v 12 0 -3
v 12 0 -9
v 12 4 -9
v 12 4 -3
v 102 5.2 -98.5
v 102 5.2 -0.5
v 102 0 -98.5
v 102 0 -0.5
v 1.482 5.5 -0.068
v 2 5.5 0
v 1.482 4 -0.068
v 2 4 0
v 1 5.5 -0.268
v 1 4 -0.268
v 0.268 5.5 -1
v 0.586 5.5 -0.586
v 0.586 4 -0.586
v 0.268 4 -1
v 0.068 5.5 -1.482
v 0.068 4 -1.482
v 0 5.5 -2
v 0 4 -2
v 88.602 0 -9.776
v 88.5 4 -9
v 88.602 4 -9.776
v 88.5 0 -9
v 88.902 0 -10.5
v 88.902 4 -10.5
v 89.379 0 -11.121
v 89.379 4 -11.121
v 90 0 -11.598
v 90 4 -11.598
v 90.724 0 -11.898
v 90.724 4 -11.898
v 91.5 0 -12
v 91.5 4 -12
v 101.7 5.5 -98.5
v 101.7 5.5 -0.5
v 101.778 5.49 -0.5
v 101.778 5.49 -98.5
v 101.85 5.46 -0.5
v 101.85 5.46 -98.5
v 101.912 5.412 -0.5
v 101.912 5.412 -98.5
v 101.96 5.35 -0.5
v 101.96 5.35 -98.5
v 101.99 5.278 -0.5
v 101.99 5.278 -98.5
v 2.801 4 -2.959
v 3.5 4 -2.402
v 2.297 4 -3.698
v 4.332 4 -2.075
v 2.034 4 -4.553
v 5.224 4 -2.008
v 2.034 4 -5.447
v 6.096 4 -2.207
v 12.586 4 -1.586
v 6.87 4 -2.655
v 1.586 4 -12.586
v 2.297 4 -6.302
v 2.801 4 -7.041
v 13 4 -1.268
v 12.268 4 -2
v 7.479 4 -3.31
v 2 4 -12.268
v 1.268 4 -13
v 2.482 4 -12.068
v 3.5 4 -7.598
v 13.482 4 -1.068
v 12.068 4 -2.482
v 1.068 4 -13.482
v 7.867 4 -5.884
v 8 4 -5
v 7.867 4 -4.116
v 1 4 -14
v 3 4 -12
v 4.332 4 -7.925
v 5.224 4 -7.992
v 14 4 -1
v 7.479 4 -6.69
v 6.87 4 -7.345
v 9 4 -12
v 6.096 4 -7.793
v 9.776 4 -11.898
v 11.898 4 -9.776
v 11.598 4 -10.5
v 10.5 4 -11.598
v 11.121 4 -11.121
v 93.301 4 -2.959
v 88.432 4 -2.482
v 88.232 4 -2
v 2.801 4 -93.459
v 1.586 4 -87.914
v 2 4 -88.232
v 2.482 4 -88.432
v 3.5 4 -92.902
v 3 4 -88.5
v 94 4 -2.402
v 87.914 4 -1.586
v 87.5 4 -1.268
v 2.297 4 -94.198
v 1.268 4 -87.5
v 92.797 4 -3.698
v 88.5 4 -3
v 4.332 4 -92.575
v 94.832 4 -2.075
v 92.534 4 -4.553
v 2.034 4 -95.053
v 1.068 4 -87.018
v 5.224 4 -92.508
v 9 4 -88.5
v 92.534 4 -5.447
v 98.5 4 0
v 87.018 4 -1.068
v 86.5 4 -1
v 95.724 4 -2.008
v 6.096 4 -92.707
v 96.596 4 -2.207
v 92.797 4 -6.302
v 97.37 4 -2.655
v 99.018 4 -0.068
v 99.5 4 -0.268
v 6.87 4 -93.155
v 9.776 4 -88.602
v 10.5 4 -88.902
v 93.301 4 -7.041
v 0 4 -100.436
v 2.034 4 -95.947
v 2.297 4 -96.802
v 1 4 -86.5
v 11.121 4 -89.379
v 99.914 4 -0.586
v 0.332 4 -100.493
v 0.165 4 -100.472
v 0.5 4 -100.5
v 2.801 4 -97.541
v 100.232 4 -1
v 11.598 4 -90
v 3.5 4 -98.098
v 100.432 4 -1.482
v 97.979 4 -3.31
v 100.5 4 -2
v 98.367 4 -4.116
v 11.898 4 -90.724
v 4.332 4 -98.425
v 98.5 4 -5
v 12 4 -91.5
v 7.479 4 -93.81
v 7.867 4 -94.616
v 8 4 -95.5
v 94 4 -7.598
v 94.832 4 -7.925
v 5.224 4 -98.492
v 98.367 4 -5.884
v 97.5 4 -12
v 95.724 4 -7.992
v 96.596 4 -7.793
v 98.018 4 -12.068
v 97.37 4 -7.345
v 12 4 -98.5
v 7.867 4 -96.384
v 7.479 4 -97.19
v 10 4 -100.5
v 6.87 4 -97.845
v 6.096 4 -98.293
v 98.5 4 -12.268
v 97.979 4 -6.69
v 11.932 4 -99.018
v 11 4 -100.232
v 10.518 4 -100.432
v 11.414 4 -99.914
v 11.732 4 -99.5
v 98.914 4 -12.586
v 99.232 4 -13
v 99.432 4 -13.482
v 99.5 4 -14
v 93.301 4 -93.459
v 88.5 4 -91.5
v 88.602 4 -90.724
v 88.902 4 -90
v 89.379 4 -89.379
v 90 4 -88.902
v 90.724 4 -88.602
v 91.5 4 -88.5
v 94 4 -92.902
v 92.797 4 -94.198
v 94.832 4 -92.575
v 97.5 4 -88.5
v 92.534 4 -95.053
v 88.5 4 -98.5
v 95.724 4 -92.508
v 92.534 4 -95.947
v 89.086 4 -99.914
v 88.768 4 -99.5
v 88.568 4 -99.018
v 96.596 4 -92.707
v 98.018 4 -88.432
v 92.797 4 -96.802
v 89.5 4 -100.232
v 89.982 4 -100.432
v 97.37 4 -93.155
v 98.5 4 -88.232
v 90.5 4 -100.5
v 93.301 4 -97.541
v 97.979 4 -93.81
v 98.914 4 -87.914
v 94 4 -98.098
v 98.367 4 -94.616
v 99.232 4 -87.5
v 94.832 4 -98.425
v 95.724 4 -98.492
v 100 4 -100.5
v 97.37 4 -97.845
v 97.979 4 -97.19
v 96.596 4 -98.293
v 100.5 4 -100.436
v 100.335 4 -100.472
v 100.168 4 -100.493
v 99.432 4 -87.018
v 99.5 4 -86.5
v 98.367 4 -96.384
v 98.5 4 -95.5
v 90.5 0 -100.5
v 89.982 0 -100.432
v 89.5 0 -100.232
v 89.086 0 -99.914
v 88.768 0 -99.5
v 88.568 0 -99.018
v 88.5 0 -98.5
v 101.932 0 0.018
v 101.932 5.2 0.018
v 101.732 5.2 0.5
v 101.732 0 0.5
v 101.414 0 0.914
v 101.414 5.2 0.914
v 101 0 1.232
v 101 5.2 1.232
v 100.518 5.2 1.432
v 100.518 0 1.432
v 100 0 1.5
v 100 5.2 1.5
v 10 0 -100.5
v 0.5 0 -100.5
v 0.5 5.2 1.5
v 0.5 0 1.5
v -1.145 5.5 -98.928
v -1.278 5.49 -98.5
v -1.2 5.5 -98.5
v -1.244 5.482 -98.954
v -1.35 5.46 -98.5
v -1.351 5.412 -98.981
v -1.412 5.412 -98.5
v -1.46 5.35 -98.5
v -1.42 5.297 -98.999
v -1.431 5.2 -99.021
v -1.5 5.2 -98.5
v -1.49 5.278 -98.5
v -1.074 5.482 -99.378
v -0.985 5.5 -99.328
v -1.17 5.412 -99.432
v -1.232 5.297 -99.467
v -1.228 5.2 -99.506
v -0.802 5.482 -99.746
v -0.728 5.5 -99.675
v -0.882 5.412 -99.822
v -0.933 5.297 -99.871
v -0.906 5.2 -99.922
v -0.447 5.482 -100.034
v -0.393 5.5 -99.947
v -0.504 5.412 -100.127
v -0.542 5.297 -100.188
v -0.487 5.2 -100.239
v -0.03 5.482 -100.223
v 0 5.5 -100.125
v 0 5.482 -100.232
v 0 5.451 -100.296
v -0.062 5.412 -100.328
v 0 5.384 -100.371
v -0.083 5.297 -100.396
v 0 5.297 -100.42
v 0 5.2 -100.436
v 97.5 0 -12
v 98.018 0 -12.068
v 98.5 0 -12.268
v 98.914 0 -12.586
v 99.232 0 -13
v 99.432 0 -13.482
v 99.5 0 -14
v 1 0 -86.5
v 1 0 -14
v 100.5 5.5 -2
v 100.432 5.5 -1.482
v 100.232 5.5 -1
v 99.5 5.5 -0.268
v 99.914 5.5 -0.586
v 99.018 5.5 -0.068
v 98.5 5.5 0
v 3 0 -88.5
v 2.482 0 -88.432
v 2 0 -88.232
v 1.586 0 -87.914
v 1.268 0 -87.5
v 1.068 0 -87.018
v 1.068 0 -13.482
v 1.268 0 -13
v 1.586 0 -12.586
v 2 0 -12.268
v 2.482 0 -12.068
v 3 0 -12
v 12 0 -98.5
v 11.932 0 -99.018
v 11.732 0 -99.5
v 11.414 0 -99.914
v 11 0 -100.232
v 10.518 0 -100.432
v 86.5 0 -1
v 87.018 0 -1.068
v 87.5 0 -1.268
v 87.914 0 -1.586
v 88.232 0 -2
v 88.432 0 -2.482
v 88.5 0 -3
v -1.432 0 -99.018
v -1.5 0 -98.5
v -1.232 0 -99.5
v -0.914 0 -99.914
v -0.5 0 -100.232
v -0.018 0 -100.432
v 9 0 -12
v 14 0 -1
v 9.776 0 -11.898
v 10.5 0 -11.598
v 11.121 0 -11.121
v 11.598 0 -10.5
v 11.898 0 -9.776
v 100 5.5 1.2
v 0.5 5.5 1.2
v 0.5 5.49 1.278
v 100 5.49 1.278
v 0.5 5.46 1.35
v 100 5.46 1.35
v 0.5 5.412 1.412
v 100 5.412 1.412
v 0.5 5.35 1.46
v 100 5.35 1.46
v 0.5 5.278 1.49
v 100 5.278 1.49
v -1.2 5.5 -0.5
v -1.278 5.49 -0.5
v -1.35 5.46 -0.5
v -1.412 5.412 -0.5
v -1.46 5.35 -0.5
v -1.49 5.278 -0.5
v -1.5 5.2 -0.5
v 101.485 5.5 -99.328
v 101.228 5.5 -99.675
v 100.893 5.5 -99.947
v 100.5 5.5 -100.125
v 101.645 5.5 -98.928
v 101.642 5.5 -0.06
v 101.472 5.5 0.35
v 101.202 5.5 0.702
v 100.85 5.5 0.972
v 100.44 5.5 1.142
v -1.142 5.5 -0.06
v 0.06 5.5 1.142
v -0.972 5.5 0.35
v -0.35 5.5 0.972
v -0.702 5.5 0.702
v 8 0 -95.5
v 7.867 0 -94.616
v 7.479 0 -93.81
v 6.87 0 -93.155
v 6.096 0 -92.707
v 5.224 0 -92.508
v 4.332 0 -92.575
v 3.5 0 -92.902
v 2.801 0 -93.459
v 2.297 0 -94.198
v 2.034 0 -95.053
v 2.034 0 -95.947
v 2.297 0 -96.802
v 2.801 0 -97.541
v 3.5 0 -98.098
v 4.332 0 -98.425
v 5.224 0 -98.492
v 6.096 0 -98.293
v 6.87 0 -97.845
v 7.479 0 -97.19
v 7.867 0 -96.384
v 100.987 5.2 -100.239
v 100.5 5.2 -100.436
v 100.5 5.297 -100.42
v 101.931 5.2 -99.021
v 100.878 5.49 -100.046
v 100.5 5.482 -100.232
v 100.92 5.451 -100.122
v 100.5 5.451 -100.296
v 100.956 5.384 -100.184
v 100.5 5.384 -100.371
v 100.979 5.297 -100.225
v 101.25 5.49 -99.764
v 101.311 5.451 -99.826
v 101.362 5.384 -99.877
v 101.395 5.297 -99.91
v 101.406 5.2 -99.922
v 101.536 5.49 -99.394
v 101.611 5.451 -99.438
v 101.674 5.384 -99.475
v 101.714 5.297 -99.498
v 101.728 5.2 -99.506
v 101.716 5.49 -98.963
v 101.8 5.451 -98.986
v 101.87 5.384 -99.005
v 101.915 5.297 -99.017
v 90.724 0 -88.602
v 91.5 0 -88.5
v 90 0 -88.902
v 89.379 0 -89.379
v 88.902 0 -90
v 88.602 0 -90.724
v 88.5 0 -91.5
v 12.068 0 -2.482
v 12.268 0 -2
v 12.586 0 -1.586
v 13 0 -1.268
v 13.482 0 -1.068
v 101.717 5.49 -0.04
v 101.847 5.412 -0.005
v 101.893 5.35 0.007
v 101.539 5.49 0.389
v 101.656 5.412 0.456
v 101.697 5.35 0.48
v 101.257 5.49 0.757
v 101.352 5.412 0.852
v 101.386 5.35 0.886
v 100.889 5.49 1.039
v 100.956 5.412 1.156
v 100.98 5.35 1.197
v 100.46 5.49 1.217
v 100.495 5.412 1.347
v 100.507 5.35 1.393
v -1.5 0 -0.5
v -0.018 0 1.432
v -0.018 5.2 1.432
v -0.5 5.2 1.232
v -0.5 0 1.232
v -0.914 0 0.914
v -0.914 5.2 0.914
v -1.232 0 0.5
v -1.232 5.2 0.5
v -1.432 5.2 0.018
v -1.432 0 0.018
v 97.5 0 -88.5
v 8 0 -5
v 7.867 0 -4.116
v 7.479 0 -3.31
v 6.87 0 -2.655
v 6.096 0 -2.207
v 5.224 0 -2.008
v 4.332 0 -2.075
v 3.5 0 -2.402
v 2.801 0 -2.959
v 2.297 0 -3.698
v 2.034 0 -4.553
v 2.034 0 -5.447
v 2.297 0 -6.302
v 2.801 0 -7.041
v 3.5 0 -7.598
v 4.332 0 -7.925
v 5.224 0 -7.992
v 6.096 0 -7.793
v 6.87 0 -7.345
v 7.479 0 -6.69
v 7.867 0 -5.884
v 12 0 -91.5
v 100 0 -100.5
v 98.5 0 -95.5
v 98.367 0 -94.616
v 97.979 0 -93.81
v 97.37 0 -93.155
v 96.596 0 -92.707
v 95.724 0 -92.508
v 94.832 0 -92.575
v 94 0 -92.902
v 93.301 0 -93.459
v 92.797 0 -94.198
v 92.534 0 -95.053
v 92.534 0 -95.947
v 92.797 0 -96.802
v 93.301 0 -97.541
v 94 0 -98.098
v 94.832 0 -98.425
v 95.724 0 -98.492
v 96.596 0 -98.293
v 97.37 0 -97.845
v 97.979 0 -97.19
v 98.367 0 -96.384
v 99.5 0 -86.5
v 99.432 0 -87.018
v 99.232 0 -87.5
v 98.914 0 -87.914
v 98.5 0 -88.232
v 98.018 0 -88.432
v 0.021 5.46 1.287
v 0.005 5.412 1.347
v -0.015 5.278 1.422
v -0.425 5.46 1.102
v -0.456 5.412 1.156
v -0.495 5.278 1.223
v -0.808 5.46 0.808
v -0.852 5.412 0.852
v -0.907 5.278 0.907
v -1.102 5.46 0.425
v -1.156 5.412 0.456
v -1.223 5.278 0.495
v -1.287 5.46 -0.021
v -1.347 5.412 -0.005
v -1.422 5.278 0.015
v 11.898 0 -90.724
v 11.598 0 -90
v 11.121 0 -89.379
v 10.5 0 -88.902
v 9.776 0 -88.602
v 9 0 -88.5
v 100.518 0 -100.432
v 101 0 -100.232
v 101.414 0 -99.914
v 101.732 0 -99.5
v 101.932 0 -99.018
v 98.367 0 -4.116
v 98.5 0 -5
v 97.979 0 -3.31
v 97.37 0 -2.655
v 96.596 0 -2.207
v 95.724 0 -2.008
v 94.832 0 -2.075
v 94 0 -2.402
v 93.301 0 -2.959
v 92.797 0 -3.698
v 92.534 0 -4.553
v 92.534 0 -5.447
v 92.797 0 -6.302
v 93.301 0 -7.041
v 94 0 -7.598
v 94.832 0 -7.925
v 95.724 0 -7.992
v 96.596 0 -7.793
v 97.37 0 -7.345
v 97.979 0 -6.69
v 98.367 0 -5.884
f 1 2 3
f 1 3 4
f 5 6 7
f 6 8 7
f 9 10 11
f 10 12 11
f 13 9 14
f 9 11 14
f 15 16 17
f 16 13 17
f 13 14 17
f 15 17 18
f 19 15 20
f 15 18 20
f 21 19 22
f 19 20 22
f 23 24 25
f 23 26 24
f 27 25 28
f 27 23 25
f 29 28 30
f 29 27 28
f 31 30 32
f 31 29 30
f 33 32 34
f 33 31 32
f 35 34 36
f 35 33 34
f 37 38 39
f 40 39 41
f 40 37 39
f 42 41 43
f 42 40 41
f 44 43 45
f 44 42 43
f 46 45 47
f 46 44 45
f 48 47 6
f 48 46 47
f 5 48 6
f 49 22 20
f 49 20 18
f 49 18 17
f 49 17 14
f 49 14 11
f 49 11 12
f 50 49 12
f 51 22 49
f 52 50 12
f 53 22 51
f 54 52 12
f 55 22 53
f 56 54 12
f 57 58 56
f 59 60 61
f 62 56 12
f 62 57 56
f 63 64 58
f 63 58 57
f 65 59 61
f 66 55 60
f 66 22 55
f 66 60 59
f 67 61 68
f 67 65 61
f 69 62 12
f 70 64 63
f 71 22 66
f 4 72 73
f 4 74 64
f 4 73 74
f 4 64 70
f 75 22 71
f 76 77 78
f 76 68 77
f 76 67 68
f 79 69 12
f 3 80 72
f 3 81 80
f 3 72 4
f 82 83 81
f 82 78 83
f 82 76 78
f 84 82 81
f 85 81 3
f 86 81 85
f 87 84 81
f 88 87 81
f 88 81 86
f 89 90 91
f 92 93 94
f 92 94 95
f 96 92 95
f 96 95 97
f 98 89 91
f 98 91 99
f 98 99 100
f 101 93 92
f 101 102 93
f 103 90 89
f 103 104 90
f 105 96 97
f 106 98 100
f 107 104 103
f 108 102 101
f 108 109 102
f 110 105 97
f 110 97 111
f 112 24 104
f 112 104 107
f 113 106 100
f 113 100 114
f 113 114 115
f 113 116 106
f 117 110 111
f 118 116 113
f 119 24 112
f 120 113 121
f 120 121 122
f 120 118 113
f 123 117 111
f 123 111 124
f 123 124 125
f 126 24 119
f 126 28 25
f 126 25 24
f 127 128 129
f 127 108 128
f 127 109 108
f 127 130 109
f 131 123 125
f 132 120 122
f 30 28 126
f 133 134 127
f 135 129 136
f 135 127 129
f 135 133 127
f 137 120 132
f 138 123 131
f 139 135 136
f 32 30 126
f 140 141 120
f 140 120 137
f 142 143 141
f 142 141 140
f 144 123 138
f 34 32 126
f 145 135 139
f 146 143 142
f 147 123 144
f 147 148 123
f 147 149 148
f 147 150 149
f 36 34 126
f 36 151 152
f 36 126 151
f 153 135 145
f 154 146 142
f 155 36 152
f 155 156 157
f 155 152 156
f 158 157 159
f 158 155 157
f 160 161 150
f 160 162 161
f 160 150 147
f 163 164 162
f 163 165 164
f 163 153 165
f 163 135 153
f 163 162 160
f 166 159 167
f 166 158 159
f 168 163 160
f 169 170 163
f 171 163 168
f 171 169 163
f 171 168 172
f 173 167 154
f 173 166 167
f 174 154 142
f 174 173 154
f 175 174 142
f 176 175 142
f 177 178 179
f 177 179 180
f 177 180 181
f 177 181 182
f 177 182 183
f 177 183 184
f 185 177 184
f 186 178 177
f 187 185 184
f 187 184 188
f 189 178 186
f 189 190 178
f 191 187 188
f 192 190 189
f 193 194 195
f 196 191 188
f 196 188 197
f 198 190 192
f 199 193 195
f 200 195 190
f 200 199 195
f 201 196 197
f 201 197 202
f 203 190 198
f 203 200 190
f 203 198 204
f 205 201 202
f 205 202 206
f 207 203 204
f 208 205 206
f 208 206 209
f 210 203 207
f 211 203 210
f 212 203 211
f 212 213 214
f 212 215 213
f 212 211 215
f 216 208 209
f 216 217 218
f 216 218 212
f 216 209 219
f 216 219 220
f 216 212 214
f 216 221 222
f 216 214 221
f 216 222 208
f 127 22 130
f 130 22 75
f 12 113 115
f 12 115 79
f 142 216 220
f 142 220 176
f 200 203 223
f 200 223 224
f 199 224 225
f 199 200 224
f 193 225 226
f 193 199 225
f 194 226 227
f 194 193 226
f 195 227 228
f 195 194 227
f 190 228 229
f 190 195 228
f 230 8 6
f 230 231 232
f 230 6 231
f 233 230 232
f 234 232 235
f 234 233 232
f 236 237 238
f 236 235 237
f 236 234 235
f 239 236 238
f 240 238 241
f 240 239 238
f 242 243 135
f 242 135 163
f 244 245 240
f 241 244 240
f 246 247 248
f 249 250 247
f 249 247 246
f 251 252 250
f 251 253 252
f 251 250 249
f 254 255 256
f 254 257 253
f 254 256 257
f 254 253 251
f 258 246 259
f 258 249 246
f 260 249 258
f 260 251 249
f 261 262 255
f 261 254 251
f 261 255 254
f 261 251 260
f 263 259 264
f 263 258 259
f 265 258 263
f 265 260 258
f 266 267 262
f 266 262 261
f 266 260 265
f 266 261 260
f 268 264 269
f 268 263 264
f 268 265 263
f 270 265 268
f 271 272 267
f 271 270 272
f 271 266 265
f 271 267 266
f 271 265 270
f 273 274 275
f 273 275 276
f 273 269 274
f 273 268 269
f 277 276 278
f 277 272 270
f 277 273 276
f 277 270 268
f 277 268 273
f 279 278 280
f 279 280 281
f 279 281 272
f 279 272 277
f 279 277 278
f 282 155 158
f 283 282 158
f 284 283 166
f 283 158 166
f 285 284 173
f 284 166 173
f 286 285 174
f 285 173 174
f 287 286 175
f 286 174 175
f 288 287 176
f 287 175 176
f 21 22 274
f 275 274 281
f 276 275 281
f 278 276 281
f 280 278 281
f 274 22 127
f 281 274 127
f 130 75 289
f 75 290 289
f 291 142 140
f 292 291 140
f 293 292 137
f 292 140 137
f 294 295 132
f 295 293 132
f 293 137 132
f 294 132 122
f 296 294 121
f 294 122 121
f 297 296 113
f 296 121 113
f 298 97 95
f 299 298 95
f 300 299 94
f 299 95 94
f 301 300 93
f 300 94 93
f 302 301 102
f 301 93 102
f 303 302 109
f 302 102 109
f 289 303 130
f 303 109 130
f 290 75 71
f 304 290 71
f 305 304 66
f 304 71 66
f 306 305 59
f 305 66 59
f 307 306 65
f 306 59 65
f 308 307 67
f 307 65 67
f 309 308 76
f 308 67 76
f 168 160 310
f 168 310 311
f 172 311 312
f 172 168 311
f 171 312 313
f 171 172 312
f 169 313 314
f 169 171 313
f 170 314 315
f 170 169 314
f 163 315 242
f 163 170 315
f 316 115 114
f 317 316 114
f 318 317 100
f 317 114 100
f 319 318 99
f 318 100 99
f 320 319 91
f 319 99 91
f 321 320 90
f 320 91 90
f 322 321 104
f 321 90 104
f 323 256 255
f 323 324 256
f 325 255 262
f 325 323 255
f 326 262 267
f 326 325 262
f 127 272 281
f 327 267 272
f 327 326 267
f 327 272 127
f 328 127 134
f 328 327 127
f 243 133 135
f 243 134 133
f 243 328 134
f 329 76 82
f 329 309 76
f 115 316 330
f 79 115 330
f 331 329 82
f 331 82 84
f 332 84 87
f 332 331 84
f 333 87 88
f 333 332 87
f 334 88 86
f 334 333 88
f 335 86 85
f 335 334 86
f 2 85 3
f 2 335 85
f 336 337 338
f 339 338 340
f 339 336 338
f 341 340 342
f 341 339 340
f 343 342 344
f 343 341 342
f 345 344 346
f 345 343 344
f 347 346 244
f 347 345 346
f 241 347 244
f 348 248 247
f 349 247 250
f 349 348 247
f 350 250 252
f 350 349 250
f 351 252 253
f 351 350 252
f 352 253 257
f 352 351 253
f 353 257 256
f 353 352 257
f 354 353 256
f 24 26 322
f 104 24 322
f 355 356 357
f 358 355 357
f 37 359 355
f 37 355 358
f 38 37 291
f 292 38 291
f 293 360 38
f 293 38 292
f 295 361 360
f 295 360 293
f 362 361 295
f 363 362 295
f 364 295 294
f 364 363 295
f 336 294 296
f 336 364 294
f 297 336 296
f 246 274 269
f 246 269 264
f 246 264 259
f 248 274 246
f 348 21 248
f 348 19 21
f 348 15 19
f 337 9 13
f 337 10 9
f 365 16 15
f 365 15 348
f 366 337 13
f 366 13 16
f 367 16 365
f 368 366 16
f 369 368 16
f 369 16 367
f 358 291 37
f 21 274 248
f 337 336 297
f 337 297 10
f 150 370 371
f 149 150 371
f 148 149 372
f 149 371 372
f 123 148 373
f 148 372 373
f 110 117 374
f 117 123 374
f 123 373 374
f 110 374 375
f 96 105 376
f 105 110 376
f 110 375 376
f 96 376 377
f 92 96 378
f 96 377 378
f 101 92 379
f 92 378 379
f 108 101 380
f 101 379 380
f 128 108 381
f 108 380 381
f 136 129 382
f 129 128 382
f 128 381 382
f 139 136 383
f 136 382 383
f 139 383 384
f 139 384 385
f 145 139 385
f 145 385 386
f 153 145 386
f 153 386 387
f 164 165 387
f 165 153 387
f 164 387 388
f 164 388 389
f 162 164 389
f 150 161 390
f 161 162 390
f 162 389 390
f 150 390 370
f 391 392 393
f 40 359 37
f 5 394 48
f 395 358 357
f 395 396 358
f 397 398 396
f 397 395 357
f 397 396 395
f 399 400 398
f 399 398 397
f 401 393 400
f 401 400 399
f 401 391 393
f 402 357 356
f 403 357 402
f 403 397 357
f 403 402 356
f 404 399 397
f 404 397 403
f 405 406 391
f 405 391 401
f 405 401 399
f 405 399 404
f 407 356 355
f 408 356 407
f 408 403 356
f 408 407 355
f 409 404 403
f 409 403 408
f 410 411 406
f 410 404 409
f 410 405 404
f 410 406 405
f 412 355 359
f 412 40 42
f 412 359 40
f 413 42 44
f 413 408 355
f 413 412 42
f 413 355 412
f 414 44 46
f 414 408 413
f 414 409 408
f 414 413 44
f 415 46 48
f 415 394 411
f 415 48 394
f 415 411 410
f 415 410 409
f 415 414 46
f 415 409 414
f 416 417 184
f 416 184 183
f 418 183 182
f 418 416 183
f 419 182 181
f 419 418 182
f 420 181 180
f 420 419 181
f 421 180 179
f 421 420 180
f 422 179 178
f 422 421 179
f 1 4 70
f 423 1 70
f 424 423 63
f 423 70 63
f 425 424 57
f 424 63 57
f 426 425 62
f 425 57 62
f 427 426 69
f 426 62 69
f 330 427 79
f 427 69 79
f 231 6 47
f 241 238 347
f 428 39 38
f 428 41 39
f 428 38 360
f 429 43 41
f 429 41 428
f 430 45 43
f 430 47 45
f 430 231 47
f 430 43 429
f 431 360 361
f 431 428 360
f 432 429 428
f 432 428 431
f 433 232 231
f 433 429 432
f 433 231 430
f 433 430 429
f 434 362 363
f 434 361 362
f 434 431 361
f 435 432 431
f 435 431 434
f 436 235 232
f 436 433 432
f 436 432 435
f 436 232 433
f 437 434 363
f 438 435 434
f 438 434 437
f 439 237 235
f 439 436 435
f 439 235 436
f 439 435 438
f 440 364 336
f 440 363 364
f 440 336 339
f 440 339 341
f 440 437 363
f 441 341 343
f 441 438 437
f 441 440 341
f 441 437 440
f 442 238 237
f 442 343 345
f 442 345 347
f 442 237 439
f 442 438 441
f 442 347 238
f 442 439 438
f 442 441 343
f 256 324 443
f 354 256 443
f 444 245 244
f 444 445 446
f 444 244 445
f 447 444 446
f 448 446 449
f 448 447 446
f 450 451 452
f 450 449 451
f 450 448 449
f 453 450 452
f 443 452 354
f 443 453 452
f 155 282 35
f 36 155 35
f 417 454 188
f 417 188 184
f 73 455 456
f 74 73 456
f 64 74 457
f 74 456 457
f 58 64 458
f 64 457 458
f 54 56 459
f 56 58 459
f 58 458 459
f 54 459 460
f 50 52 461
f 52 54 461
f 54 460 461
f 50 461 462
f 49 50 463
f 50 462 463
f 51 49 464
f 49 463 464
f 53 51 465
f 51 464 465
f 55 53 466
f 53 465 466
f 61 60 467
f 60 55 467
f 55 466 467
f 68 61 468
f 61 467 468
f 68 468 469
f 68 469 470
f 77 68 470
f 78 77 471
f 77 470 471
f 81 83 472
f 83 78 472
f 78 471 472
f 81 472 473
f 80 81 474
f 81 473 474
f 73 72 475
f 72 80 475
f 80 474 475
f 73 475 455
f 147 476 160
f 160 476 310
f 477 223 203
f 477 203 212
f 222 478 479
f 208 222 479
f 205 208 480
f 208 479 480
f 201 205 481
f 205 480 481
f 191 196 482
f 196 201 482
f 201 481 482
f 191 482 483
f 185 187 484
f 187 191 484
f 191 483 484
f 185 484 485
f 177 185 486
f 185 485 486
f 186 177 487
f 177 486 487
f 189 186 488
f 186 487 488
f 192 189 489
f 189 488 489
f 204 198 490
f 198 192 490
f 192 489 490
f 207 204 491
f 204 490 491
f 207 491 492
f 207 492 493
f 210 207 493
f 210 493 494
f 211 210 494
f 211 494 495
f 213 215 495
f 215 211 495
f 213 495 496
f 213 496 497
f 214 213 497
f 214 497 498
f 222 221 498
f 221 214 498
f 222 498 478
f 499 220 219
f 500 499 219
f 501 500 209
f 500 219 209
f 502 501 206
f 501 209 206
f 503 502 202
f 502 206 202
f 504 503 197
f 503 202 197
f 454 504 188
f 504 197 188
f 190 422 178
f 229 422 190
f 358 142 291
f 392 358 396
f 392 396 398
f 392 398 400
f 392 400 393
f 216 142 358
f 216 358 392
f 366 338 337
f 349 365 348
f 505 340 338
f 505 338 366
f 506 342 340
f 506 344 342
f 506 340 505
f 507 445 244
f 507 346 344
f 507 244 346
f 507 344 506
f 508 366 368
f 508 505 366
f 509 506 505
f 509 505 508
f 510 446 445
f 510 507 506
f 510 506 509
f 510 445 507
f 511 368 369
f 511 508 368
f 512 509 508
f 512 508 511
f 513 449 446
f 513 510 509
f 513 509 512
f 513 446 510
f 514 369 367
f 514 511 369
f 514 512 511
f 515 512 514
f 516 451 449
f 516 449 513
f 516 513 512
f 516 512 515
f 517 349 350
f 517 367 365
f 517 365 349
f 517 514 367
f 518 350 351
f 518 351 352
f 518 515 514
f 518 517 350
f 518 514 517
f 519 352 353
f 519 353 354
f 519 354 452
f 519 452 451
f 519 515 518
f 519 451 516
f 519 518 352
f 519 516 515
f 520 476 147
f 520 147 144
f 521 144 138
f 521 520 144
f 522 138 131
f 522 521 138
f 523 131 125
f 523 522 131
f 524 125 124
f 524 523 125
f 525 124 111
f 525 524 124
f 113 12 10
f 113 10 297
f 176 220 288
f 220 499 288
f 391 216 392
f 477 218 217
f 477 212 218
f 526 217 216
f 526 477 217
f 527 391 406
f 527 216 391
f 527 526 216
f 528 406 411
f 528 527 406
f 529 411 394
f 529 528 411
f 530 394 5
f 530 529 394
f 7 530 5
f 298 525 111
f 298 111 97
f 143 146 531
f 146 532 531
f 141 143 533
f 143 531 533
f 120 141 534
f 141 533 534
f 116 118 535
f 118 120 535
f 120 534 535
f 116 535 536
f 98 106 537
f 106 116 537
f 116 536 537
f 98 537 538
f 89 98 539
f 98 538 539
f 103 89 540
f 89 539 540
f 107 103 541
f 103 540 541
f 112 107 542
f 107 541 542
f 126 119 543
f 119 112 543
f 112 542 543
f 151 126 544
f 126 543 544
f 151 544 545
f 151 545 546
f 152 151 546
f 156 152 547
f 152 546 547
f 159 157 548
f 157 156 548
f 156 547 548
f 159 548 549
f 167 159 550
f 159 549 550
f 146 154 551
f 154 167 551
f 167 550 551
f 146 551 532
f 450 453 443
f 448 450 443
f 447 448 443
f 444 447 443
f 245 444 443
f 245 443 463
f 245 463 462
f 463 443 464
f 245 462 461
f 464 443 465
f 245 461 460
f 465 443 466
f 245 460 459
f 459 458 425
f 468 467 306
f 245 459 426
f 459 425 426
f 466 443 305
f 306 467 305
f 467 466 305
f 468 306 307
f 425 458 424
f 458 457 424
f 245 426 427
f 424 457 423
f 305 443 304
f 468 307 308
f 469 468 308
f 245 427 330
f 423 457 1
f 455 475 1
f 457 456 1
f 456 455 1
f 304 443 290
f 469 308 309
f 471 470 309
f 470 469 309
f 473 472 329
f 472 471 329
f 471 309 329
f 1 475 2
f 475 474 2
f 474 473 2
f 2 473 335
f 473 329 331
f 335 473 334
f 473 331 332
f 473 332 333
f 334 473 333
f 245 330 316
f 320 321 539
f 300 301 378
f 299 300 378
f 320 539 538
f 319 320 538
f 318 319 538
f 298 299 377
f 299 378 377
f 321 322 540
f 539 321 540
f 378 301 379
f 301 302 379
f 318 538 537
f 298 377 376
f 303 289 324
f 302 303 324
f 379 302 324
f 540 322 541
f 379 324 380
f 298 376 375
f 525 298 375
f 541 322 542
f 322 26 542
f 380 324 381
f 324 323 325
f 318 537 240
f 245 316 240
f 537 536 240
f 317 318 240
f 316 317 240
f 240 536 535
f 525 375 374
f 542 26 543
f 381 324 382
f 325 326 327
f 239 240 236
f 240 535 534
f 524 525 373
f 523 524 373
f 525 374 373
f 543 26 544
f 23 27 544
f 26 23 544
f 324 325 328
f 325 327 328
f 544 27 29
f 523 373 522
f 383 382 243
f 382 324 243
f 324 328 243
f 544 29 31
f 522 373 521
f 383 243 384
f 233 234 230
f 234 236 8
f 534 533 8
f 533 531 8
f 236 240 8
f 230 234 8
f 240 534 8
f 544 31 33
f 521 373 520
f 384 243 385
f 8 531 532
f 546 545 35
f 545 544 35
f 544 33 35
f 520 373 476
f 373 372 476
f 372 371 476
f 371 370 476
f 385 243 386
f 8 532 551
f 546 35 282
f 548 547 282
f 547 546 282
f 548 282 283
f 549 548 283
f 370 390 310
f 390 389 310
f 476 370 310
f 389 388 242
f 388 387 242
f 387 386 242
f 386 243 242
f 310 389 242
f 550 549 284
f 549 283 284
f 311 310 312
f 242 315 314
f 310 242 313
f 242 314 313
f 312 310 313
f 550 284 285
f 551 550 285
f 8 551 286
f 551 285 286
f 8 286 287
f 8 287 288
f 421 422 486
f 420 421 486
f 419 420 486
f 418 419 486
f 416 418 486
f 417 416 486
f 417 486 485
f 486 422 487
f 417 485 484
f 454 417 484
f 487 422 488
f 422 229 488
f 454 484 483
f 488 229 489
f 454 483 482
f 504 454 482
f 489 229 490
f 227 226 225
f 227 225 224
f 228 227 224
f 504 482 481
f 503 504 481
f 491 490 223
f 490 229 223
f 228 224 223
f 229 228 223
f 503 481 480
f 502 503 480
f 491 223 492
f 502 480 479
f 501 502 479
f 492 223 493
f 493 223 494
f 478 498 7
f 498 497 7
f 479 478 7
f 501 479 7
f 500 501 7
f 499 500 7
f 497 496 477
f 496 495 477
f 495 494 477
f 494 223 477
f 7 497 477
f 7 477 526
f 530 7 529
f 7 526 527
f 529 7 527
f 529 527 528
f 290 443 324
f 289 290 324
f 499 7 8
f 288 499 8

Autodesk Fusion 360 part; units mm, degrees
sketch "Sketch1" plane through (0, 0, 0) normal (0, 1, 0) x (1, 0, 0)
  line L0 (2, 0) -> (98.5, 0) construction
  line L1 (100.5, 2) -> (100.5, 98.5) construction
  line L2 (98.5, 100.5) -> (2, 100.5) construction
  line L3 (0, 98.5) -> (0, 2) construction
  circle A0 centre (5, 95.5) radius 1.6 construction
  circle A1 centre (95.5, 95.5) radius 1.6 construction
  circle A2 centre (5, 5) radius 1.6 construction
  circle A3 centre (95.5, 5) radius 1.6 construction
  line L4 (99.5, 97.5) -> (99.5, 3)
  line L5 (97.5, 1) -> (3, 1)
  line L6 (1, 3) -> (1, 97.5)
  line L7 (102, 98.5) -> (102, 0.5)
  line L8 (100, -1.5) -> (0.5, -1.5)
  line L9 (-1.5, 0.5) -> (-1.5, 98.5)
  arc A4 (100, -1.5) -> (102, 0.5) centre (100, 0.5) ccw
  arc A5 (-1.5, 0.5) -> (0.5, -1.5) centre (0.5, 0.5) ccw
  arc A6 (0.5, 100.5) -> (-1.5, 98.5) centre (0.5, 98.5) ccw
  arc A7 (102, 98.5) -> (100, 100.5) centre (100, 98.5) ccw
  arc A8 (97.5, 1) -> (99.5, 3) centre (97.5, 3) ccw
  arc A9 (99.5, 97.5) -> (97.5, 99.5) centre (97.5, 97.5) ccw
  arc A10 (3, 99.5) -> (1, 97.5) centre (3, 97.5) ccw
  arc A11 (1, 3) -> (3, 1) centre (3, 3) ccw
  line L10 (99.5, 88.5) -> (91.5, 88.5)
  line L11 (88.5, 91.5) -> (88.5, 99.5)
  line L12 (99.5, 12) -> (91.5, 12)
  line L13 (88.5, 9) -> (88.5, 1)
  line L14 (1, 12) -> (9, 12)
  line L15 (12, 9) -> (12, 1)
  line L16 (12, 99.5) -> (12, 91.5)
  line L17 (9, 88.5) -> (1, 88.5)
  arc A12 (88.5, 91.5) -> (91.5, 88.5) centre (91.5, 91.5) ccw
  arc A13 (9, 88.5) -> (12, 91.5) centre (9, 91.5) ccw
  arc A14 (12, 9) -> (9, 12) centre (9, 9) ccw
  arc A15 (91.5, 12) -> (88.5, 9) centre (91.5, 9) ccw
  circle A16 centre (95.5, 95.5) radius 3
  circle A17 centre (95.5, 5) radius 3
  circle A18 centre (5, 5) radius 3
  circle A19 centre (5, 95.5) radius 3
  line L18 (3, 99.5) -> (12, 99.5)
  line L19 (88.5, 99.5) -> (97.5, 99.5)
  line L20 (88.5, 99.5) -> (88.5, 100.5)
  line L21 (12, 99.5) -> (12, 100.5)
  line L22 (0.5, 100.5) -> (12, 100.5)
  line L23 (88.5, 100.5) -> (100, 100.5)
  arc A20 (98.5, 0) -> (100.5, 2) centre (98.5, 2) ccw construction
  arc A21 (100.5, 98.5) -> (98.5, 100.5) centre (98.5, 98.5) ccw construction
  arc A22 (2, 100.5) -> (0, 98.5) centre (2, 98.5) ccw construction
  arc A23 (0, 2) -> (2, 0) centre (2, 2) ccw construction
  point P0 (100.5, 0)
  point P1 (0, 100.5)
  dimension "d1" = 100.5
  dimension "d2" = 100.5
  dimension "d3" = 3.2
  dimension "d4" = 5
  dimension "d5" = 5
  dimension "d6" = 3.2
  dimension "d7" = 3.2
  dimension "d8" = 3.2
  dimension "d9" = 5
  dimension "d10" = 1
  dimension "d11" = 1
  dimension "d12" = 1
  dimension "d13" = 1
  dimension "d14" = 2.5
  dimension "d15" = 2.5
  dimension "d16" = 2.5
  dimension "d17" = 2
  dimension "d18" = 2
  dimension "d19" = 2
  dimension "d20" = 2
  dimension "d21" = 2
  dimension "d22" = 2
  dimension "d23" = 2
  dimension "d24" = 2
  dimension "d27" = 12
  dimension "d28" = 12
  dimension "d29" = 12
  dimension "d30" = 12
  dimension "d31" = 12
  dimension "d32" = 12
  dimension "d33" = 12
  dimension "d34" = 12
  dimension "d35" = 3
  dimension "d36" = 3
  dimension "d37" = 6
  dimension "d38" = 6
  dimension "d39" = 6
  dimension "d40" = 6
  dimension "d43" = 2
  dimension "d44" = 2
  dimension "d45" = 2
  dimension "d46" = 2
extrude "Extrude1" add sketch "Sketch1" along normal blind 4
sketch "Sketch2" plane through (0, 4, 0) normal (0, 1, 0) x (-1, 0, 0)
  circle A0 centre (-95.5, -5) radius 3
  circle A1 centre (-5, -5) radius 3
  circle A2 centre (-95.5, -95.5) radius 3
  circle A3 centre (-5, -95.5) radius 3
  arc A4 (-88.5, -91.5) -> (-91.5, -88.5) centre (-91.5, -91.5) ccw
  line L0 (-91.5, -88.5) -> (-99.5, -88.5)
  line L1 (-99.5, -88.5) -> (-99.5, -12)
  line L2 (-99.5, -12) -> (-91.5, -12)
  arc A5 (-91.5, -12) -> (-88.5, -9) centre (-91.5, -9) ccw
  line L3 (-88.5, -9) -> (-88.5, -1)
  line L4 (-88.5, -1) -> (-12, -1)
  line L5 (-12, -1) -> (-12, -9)
  arc A6 (-12, -9) -> (-9, -12) centre (-9, -9) ccw
  line L6 (-9, -12) -> (-1, -12)
  line L7 (-1, -12) -> (-1, -88.5)
  line L8 (-1, -88.5) -> (-9, -88.5)
  arc A7 (-9, -88.5) -> (-12, -91.5) centre (-9, -91.5) ccw
  line L9 (-12, -91.5) -> (-12, -100.5)
  line L10 (-12, -100.5) -> (-0.5, -100.5)
  arc A8 (-0.5, -100.5) -> (1.5, -98.5) centre (-0.5, -98.5) ccw
  line L11 (1.5, -98.5) -> (1.5, -0.5)
  arc A9 (1.5, -0.5) -> (-0.5, 1.5) centre (-0.5, -0.5) ccw
  line L12 (-0.5, 1.5) -> (-100, 1.5)
  arc A10 (-100, 1.5) -> (-102, -0.5) centre (-100, -0.5) ccw
  line L13 (-102, -0.5) -> (-102, -98.5)
  arc A11 (-102, -98.5) -> (-100, -100.5) centre (-100, -98.5) ccw
  line L14 (-100, -100.5) -> (-88.5, -100.5)
  line L15 (-88.5, -100.5) -> (-88.5, -91.5)
  arc A12 (0, -2) -> (-2, 0) centre (-2, -2) ccw
  line L16 (-2, 0) -> (-98.5, 0)
  arc A13 (1.5, -0.5) -> (-0.5, 1.5) centre (-0.5, -0.5) ccw
  line L17 (-0.5, 1.5) -> (-100, 1.5)
  arc A14 (-98.5, 0) -> (-100.5, -2) centre (-98.5, -2) ccw
  line L18 (-100.5, -2) -> (-100.5, -98.5)
  arc A15 (-100, 1.5) -> (-102, -0.5) centre (-100, -0.5) ccw
  line L19 (-102, -98.5) -> (-102, -0.5)
  line L20 (-98.5, -100.5) -> (-2, -100.5)
  line L21 (-100, -100.5) -> (-88.5, -100.5)
  arc A16 (-102, -98.5) -> (-100, -100.5) centre (-100, -98.5) ccw
  line L22 (-102, -0.5) -> (-102, -98.5)
  line L23 (0, -98.5) -> (0, -2)
  arc A17 (-0.5, -100.5) -> (1.5, -98.5) centre (-0.5, -98.5) ccw
  line L24 (1.5, -98.5) -> (1.5, -0.5)
  line L25 (0, -98.5) -> (0, -100.5)
  line L26 (-100.5, -98.5) -> (-100.5, -100.5)
extrude "Extrude3" add sketch "Sketch2" along normal blind 1.5 contours A8 L11 A9 L12 A10 L13 A11 A12 L16 A13 L17 A14 L18 A15 L19 A16 L22 L23 A17 L24 L25 L26
fillet "Fillet2" radius 0.3 7 edges at (-1.0811, 5.5, -99.7247) (-1.5, 5.5, -49.5) (-0.9142, 5.5, 0.9142) (50.25, 5.5, 1.5) (101.4142, 5.5, 0.9142) (102, 5.5, -49.5) (101.5811, 5.5, -99.7247)
extrude "Extrude2" add sketch "Sketch2" along normal blind 1.5 contours A8 L11 A9 L12 A10 L13 A11 A12 L16 A13 L17 A14 L18 A15 L19 A16 L22 L23 A17 L24 L25 L26
fillet "Fillet1" radius 0.3 7 edges at (-1.0811, 5.5, -99.7247) (-1.5, 5.5, -49.5) (-0.9142, 5.5, 0.9142) (50.25, 5.5, 1.5) (101.4142, 5.5, 0.9142) (102, 5.5, -49.5) (101.5811, 5.5, -99.7247)
fillet "Fillet3" radius 2 1 edges at (12, 2, -100.5)
fillet "Fillet3" radius 2 1 edges at (88.5, 2, -100.5)
fillet "Fillet3" radius 2 1 edges at (99.5, 2, -88.5)
fillet "Fillet3" radius 2 1 edges at (99.5, 2, -12)
fillet "Fillet3" radius 2 1 edges at (88.5, 2, -1)
fillet "Fillet3" radius 2 1 edges at (12, 2, -1)
fillet "Fillet3" radius 2 1 edges at (1, 2, -12)
fillet "Fillet3" radius 2 1 edges at (1, 2, -88.5)
